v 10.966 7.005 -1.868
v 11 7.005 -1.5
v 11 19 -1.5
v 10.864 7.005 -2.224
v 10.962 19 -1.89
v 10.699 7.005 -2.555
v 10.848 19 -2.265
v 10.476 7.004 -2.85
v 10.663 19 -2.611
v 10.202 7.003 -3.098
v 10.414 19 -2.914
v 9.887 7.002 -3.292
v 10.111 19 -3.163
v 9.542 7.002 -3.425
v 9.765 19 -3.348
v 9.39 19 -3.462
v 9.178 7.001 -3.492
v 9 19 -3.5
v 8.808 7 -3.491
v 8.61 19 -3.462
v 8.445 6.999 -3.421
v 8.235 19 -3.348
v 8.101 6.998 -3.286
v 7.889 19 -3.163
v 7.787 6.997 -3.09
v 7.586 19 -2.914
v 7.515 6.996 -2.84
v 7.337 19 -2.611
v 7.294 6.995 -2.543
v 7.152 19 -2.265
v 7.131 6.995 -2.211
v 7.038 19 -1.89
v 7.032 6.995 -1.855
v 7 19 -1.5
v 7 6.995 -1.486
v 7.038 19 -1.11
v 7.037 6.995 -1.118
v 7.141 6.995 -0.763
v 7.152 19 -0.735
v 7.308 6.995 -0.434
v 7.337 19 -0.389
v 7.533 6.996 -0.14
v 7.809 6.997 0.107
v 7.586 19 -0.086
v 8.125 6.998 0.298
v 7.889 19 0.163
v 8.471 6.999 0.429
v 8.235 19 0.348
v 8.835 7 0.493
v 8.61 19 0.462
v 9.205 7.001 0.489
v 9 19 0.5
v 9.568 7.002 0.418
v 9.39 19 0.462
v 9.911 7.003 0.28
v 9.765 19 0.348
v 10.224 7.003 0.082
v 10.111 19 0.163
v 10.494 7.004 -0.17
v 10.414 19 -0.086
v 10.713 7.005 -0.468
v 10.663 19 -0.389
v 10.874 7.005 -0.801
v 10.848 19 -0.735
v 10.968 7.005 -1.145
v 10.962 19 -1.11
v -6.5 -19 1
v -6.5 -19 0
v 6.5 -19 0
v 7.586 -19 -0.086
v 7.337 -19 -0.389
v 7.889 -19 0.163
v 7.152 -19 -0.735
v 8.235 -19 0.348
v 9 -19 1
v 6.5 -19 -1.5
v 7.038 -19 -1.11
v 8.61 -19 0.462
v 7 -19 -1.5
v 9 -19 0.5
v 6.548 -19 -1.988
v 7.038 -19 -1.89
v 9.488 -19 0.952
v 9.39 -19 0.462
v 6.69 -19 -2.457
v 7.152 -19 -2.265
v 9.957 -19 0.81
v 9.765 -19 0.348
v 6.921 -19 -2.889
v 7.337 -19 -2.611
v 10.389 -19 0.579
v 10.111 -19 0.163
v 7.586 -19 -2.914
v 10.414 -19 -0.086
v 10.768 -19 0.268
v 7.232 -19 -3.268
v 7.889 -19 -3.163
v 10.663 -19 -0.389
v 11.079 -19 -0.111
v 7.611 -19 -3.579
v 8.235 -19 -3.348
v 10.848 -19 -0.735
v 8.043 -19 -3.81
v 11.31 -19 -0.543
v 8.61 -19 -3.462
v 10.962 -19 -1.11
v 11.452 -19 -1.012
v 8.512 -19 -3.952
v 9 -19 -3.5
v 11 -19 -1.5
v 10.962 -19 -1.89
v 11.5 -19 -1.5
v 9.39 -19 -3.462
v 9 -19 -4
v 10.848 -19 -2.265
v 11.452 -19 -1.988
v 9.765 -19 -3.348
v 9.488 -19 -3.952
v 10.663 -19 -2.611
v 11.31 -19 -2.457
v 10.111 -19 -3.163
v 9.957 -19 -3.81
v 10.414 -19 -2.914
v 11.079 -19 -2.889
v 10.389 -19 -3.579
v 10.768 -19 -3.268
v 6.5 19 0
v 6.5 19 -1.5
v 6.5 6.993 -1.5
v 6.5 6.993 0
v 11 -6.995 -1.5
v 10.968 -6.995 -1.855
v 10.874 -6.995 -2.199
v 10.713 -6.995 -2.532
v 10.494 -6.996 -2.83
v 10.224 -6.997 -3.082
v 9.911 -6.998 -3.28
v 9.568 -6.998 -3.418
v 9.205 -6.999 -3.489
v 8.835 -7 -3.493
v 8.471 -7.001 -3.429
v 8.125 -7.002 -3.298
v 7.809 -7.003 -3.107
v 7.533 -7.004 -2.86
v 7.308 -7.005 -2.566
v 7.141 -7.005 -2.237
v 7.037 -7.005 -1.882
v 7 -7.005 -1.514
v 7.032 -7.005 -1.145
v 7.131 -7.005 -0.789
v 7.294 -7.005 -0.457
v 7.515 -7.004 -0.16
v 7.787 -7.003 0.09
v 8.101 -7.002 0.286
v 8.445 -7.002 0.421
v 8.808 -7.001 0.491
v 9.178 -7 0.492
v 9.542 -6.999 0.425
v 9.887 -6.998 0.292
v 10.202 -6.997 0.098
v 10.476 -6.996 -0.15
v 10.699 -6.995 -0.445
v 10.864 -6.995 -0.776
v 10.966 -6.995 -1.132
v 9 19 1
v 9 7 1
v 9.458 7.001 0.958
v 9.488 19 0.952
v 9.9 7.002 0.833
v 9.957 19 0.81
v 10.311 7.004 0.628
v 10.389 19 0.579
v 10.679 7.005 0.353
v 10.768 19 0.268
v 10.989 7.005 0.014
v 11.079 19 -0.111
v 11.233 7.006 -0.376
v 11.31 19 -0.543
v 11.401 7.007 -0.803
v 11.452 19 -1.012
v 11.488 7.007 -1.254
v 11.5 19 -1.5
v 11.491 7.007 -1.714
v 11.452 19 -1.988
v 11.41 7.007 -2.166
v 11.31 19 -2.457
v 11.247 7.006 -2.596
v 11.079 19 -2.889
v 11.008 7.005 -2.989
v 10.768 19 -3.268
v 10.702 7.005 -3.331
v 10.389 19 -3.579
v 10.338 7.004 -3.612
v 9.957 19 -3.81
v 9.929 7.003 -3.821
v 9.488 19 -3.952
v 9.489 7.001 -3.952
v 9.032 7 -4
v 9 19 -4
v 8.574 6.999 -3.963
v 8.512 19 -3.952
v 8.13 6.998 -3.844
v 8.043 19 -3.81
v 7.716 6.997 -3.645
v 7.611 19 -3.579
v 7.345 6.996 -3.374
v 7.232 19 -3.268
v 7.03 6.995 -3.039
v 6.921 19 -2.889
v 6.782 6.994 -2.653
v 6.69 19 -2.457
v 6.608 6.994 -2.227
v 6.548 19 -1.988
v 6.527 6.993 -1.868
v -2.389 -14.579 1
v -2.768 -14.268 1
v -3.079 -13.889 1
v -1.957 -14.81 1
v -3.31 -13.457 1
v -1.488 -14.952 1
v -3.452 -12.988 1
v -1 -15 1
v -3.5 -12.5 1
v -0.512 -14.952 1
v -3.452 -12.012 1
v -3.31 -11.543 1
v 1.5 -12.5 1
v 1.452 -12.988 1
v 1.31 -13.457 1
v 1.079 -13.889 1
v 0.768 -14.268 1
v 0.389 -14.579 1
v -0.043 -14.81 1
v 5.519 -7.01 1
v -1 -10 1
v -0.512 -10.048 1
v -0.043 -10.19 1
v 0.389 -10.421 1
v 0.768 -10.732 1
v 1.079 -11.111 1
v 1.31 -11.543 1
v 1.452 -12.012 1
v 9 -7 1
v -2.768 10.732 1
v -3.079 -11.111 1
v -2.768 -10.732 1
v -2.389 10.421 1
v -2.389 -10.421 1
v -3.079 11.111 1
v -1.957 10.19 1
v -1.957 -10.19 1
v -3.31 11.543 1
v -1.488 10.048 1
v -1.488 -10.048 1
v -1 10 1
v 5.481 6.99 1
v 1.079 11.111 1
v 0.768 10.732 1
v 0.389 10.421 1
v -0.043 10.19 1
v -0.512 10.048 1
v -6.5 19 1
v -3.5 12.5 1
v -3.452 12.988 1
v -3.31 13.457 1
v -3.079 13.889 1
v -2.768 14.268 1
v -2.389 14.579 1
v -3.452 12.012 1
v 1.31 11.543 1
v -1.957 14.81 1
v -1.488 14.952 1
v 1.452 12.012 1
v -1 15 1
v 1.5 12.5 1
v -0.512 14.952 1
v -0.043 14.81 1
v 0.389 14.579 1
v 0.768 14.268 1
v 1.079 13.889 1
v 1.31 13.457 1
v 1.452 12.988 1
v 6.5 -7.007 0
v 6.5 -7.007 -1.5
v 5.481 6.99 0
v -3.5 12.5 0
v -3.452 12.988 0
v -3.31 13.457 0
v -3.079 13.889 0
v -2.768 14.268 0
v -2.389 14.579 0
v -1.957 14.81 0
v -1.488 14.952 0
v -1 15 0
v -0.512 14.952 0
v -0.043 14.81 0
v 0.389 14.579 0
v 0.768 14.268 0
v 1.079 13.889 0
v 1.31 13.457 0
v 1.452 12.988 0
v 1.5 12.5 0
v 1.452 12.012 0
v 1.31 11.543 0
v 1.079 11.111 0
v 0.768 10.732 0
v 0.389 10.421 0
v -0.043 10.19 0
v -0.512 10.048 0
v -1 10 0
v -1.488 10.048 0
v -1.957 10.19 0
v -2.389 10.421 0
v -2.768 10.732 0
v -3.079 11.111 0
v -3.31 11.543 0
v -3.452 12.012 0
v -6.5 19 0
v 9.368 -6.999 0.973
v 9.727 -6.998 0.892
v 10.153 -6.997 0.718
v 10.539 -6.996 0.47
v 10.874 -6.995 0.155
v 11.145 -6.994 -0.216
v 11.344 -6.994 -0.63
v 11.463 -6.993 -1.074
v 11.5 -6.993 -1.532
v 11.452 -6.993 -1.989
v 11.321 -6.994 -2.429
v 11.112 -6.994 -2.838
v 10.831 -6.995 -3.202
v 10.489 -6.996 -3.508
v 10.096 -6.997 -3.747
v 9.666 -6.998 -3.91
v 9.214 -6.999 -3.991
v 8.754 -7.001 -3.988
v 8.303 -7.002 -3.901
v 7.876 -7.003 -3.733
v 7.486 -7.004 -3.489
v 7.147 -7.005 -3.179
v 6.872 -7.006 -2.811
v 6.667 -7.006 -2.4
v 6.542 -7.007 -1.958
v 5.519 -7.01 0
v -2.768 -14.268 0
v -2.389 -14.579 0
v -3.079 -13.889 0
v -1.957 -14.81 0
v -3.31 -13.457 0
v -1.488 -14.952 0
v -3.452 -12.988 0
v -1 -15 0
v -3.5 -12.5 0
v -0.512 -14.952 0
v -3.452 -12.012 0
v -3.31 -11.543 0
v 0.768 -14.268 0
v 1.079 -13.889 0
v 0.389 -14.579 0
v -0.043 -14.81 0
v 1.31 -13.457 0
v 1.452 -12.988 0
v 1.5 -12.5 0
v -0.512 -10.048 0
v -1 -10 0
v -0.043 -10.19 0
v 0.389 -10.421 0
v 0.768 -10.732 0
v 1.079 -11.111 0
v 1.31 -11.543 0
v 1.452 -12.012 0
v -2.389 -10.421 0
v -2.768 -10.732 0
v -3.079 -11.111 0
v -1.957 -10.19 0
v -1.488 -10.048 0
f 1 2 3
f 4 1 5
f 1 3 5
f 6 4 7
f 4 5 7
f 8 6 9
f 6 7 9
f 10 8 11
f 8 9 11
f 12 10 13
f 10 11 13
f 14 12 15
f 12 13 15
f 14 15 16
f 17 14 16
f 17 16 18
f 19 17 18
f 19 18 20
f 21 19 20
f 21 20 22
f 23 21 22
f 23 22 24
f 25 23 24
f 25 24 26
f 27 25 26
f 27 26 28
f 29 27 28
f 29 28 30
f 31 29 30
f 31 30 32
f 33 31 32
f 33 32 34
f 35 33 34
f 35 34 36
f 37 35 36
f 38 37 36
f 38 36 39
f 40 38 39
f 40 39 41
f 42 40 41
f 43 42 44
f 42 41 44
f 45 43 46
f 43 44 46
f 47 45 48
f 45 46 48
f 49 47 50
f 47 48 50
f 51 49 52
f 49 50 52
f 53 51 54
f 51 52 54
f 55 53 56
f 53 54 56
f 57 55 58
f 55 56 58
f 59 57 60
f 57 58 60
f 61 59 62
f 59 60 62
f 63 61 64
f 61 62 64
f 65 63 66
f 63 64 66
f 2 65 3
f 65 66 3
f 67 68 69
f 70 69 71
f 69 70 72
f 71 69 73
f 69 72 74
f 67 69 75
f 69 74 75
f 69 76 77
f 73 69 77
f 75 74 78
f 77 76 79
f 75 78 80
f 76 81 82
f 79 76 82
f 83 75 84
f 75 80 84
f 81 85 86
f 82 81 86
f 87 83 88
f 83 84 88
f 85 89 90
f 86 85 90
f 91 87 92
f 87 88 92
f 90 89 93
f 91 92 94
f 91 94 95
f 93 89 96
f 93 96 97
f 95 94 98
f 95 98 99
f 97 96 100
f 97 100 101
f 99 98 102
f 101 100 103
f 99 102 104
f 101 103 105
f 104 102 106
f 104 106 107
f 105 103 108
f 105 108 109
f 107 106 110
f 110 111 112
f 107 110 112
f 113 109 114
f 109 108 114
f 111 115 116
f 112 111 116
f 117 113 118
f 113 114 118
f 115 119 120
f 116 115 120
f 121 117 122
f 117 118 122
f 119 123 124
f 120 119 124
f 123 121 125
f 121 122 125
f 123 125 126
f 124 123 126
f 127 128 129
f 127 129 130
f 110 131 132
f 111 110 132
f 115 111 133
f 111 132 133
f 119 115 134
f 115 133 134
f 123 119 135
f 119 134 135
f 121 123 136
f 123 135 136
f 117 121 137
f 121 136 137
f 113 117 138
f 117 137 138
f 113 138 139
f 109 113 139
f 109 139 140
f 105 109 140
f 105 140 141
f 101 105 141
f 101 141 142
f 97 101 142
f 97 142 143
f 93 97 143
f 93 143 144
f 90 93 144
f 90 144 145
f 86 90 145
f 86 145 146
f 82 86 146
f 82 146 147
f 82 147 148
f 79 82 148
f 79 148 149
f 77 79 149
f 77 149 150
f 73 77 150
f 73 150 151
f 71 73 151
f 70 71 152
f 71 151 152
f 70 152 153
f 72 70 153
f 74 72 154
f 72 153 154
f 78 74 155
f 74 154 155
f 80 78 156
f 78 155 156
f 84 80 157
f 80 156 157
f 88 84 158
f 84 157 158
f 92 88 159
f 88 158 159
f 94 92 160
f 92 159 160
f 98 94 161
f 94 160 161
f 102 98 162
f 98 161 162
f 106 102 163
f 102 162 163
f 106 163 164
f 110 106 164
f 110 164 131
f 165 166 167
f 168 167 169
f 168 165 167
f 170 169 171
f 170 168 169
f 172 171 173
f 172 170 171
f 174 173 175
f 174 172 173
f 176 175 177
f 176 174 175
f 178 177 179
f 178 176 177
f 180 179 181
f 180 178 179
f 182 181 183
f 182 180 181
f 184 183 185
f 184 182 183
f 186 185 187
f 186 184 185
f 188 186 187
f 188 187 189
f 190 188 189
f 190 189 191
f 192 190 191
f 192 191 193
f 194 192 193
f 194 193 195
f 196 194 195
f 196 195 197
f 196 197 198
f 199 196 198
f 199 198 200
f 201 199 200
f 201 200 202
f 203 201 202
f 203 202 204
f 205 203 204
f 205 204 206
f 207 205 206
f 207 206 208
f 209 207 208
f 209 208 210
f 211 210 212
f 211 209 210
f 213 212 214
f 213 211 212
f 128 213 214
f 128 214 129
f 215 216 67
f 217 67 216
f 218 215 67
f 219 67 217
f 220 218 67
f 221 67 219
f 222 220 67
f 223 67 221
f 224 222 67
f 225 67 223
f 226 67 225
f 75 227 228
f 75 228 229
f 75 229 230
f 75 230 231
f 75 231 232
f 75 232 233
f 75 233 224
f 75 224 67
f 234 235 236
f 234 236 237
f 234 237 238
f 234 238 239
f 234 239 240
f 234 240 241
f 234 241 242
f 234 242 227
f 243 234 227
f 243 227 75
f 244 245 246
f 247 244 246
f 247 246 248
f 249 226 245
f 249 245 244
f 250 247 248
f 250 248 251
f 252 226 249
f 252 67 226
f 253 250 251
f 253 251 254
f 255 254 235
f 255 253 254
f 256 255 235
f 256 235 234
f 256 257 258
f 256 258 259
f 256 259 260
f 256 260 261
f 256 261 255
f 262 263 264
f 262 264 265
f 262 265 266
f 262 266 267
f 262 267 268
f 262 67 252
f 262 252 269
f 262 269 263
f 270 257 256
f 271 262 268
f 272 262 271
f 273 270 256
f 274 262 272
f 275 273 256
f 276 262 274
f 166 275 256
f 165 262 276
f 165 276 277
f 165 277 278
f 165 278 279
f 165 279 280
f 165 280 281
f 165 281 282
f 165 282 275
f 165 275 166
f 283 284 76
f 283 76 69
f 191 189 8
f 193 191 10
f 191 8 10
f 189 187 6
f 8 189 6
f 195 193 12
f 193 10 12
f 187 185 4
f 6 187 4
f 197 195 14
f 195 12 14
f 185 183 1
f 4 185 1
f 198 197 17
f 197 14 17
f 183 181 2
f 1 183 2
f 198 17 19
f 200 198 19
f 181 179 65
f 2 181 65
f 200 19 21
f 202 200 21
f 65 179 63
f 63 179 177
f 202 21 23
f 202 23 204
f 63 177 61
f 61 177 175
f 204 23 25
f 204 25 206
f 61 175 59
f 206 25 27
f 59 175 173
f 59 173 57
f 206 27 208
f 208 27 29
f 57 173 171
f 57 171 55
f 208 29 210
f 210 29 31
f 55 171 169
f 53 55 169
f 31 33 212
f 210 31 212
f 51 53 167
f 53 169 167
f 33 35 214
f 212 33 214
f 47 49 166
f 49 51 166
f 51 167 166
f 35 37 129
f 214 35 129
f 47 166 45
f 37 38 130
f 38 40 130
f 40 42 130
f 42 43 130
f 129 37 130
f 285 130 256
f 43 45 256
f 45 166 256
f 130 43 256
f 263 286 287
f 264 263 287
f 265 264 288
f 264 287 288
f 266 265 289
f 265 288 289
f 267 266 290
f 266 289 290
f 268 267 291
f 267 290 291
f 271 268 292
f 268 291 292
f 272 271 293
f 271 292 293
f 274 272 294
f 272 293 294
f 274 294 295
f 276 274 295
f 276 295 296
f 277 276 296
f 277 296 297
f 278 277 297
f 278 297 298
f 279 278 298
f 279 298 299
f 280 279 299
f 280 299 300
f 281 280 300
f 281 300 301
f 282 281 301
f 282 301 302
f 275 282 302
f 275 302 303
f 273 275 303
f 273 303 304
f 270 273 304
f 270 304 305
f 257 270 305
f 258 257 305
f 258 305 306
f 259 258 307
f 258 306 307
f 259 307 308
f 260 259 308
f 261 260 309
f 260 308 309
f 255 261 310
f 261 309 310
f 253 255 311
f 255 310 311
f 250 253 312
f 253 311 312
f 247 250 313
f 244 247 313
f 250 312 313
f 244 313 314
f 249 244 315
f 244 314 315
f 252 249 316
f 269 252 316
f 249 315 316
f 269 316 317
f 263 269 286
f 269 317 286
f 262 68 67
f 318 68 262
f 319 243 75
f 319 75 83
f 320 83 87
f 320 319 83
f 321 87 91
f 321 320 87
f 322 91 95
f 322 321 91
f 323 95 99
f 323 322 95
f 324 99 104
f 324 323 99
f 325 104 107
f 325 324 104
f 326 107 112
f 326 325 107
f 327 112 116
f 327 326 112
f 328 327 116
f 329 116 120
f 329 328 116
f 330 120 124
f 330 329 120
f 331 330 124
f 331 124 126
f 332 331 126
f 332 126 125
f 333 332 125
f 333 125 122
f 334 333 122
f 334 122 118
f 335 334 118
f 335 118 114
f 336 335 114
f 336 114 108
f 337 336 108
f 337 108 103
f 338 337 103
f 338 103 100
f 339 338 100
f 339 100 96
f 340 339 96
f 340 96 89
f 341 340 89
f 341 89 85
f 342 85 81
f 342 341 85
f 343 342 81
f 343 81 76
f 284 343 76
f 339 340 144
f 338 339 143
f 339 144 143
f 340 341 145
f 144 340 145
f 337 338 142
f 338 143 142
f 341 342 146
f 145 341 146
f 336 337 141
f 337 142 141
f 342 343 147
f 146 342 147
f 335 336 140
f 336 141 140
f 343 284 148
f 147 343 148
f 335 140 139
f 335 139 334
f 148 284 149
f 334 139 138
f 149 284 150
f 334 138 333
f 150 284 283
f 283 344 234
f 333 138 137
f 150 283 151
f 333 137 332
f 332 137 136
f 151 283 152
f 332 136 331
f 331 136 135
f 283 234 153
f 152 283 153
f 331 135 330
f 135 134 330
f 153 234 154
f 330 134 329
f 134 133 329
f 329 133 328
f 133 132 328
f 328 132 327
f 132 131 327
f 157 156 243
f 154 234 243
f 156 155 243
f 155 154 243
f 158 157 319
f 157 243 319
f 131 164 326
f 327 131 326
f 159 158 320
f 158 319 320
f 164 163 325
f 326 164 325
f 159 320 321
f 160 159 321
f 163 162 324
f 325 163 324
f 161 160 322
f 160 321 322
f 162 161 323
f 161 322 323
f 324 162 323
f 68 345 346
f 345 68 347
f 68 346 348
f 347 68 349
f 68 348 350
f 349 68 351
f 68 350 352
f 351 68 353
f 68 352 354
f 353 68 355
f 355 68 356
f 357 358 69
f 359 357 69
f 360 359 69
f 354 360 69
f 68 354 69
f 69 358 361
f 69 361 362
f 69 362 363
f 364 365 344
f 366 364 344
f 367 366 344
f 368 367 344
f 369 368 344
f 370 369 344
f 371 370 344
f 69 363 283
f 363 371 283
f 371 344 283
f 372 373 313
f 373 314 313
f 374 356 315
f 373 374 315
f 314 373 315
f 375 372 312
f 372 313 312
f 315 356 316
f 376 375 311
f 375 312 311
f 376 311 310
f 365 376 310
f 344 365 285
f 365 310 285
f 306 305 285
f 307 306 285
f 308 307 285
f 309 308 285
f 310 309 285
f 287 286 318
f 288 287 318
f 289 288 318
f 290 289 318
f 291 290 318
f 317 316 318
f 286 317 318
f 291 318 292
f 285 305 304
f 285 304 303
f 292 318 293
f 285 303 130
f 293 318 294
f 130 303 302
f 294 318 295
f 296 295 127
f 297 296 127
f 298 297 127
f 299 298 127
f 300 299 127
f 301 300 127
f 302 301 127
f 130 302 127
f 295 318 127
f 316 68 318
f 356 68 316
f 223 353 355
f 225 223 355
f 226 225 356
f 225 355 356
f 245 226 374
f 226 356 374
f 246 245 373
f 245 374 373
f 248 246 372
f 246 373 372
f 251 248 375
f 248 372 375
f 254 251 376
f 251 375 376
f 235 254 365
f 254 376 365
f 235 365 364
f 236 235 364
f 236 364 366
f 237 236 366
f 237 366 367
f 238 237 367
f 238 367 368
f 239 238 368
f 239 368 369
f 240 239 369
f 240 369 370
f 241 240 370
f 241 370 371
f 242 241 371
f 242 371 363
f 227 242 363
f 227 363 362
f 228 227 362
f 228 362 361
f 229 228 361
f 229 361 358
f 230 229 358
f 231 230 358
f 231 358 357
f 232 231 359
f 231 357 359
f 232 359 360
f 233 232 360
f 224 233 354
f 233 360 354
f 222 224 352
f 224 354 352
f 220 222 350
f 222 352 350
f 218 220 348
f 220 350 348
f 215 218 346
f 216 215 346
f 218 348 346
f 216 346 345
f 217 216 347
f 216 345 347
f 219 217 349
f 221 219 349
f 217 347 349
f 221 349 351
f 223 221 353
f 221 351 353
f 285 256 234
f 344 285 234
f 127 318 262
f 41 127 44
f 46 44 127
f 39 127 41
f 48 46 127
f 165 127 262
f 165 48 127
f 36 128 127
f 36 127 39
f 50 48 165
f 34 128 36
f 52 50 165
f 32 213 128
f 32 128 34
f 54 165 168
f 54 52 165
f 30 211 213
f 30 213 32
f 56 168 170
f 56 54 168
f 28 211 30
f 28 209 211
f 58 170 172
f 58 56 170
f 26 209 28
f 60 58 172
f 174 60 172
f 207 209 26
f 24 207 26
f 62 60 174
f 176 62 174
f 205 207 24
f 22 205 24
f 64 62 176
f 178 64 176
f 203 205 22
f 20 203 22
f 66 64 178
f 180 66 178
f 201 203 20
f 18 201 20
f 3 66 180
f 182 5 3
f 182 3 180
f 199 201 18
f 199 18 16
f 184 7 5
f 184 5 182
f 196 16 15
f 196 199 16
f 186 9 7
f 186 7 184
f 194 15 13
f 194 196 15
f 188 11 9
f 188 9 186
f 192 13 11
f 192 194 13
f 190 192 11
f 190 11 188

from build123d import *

# Parameters (mm, degrees)
SKETCH_1_W          = 13
SKETCH_1_H          = 38
EXTRUDE_1_DEPTH     = 1
SKETCH_2_R          = 2
EXTRUDE_2_DEPTH     = 38
CUT_EXTRUDE_1_DEPTH = 10
SKETCH_4_R          = 2.5
CUT_EXTRUDE_2_DEPTH = 2


with BuildPart() as part:
    # 草图1 → 凸台-拉伸1 (new body)
    with BuildSketch(Plane.XY):
        Rectangle(SKETCH_1_W, SKETCH_1_H)
    extrude(amount=EXTRUDE_1_DEPTH)

    # 草图2 → 凸台-拉伸2 (add)
    with BuildSketch(Plane(origin=(0, 19, 0), x_dir=(1, 0, 0), z_dir=(0, 1, 0))):
        with BuildLine():
            Line((6.5, -1), (9, -1))
            ThreePointArc((9, -1), (10.767766953, 3.267766953), (6.5, 1.5))
            Line((6.5, 1.5), (6.5, -1))
        make_face()
        with Locations((9, 1.5)):
            Circle(SKETCH_2_R, mode=Mode.SUBTRACT)
    extrude(amount=-EXTRUDE_2_DEPTH)

    # 草图3 → 切除-拉伸1 (cut)
    with BuildSketch(Plane.XY.offset(1)):
        Polygon((5.519068854, -7.009502005), (12.519042916, -6.99044612), (12.480931146, 7.009502005), (5.480957084, 6.99044612), align=None)
    extrude(amount=-CUT_EXTRUDE_1_DEPTH, mode=Mode.SUBTRACT)

    # 草图4 → 切除-拉伸2 (cut)
    with BuildSketch(Plane(origin=(0, 0, 0), x_dir=(-1, 0, 0), z_dir=(0, 0, -1))):
        with Locations((1, 12.5)):
            Circle(SKETCH_4_R)
        with Locations((1, -12.5)):
            Circle(SKETCH_4_R)
    extrude(amount=-CUT_EXTRUDE_2_DEPTH, mode=Mode.SUBTRACT)


solid = part.part
